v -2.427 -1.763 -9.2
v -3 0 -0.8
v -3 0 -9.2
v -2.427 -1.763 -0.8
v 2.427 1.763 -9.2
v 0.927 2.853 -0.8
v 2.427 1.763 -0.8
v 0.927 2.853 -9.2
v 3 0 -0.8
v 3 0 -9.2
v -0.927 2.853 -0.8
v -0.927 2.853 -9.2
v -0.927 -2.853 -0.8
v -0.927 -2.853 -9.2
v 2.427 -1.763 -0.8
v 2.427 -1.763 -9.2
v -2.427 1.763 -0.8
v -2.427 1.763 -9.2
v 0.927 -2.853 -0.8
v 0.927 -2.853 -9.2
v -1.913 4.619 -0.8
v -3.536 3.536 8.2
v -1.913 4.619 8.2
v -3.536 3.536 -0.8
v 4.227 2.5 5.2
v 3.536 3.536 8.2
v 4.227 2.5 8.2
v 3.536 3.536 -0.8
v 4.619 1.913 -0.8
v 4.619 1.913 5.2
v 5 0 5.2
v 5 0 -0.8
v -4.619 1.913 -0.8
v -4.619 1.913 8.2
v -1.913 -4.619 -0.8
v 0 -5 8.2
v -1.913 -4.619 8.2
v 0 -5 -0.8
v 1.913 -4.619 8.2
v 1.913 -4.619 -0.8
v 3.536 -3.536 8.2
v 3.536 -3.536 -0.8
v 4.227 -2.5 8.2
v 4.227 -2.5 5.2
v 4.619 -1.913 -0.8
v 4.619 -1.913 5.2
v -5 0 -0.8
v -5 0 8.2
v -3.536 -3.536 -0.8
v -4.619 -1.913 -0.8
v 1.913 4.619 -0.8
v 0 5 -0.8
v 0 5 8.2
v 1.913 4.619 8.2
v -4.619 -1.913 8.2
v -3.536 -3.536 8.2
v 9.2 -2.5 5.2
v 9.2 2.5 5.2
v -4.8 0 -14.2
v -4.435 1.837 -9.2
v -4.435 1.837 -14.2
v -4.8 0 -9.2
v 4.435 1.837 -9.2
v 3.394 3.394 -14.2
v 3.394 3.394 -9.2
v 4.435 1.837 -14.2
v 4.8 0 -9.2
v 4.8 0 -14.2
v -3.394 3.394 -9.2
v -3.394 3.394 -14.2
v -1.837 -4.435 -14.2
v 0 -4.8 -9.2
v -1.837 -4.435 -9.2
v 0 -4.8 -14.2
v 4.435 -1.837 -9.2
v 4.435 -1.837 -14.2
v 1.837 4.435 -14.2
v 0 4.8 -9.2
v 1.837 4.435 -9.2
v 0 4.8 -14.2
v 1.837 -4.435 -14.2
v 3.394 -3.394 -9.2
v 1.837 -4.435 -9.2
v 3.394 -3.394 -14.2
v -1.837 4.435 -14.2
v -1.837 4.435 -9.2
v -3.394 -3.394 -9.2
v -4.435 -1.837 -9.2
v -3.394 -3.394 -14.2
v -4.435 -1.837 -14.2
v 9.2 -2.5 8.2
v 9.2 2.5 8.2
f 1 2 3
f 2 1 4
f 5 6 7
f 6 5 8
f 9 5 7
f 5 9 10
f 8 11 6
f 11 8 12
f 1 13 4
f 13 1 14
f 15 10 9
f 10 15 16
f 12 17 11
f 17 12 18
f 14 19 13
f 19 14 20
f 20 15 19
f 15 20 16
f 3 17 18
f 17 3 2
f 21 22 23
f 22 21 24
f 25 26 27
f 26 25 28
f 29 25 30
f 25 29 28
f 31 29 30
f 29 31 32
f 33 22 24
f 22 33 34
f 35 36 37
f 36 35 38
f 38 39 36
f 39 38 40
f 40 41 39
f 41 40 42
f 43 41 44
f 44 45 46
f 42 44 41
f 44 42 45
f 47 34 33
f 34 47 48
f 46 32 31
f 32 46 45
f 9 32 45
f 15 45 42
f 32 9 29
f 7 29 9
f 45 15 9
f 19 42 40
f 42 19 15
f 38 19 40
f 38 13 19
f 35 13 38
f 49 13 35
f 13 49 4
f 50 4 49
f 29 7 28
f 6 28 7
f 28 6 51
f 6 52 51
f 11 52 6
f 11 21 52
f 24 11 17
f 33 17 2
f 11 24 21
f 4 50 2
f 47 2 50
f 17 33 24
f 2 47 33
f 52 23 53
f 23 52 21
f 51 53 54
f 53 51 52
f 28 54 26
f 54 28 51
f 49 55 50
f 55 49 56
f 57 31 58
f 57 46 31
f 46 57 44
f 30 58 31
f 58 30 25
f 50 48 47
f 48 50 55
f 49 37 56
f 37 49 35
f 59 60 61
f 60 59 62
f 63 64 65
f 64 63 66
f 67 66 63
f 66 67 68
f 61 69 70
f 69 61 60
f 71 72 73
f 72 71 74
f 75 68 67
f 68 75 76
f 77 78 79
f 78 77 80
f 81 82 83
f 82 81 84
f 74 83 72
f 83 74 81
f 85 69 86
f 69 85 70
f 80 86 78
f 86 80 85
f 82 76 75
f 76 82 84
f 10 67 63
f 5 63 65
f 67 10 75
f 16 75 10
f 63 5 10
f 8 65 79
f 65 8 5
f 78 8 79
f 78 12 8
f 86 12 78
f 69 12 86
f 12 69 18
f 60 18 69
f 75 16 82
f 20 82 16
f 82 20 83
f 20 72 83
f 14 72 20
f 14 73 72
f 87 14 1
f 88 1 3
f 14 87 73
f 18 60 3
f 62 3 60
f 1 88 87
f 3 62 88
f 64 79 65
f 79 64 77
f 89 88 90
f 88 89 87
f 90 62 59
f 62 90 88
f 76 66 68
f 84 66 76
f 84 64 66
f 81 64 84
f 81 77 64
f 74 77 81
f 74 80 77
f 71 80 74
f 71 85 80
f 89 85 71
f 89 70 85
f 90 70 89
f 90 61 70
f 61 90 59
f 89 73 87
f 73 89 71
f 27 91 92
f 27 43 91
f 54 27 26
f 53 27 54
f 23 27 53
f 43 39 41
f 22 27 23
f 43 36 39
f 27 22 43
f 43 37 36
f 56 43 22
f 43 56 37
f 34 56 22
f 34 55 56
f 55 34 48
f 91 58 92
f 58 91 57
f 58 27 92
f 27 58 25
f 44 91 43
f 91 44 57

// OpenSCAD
// Parameters
shank_diameter_mm = 6.0; //[3.0:12.0:0.1]
under_head_length_mm = 10.0; //[5.0:30.0:0.5]
head_diameter_mm = 10.0; //[6.0:20.0:0.1]
head_height_mm = 6.0; //[3.0:12.0:0.1]
socket_across_flats_mm = 5.0; //[3.0:10.0:0.1]
socket_depth_mm = 4.0; //[2.0:8.0:0.1]
under_head_chamfer_height_mm = 0.8; //[0.0:2.0:0.1]
overlap_mm = 0.8; //[0.2:2.0:0.1]

// Pcb Spacer - complete geometry
module pcb_spacer() {
  color([0.85, 0.85, 0.8]) {
    cylinder(r=shank_diameter_mm/2 + 1.8, h=under_head_length_mm/2, center=true);
  }
}

// Screw And Washer - complete geometry
module screw_and_washer() {
  color("DimGray") {
    union() {
      // Shank
      translate([0, 0, -under_head_length_mm/2])
        cylinder(r=shank_diameter_mm/2, h=under_head_length_mm, center=true);
      // Cap Head
      translate([0, 0, head_height_mm/2 - overlap_mm])
        cylinder(r=head_diameter_mm/2, h=head_height_mm, center=true);
      // Under-head Chamfer
      translate([0, 0, -under_head_chamfer_height_mm/2])
        cylinder(r1=head_diameter_mm/2, r2=shank_diameter_mm/2, h=under_head_chamfer_height_mm, center=true);
    }
    // Hex Socket Recess
    translate([0, 0, head_height_mm - socket_depth_mm/2 - overlap_mm])
      rotate([0, 0, 0])
      cylinder(r=socket_across_flats_mm/(2*cos(30)), h=socket_depth_mm, center=true);
  }
}

// Buzzer - complete geometry
module buzzer() {
  color([0.1, 0.1, 0.6]) {
    translate([0, 0, head_height_mm + (head_height_mm/4) - overlap_mm])
      cylinder(r=head_diameter_mm/2, h=head_height_mm/2, center=true);
  }
}

// Pin Socket - complete geometry
module pin_socket() {
  color([0.2, 0.2, 0.2]) {
    translate([head_diameter_mm/2 - overlap_mm, 0, head_height_mm + (head_height_mm/4) - overlap_mm])
      cube([head_diameter_mm, head_diameter_mm/2, head_height_mm/2], center=true);
  }
}

// Assembly
module assembly() {
  screw_and_washer();
  translate([0, 0, -under_head_length_mm - (under_head_length_mm/4) + overlap_mm]) pcb_spacer();
  buzzer();
  pin_socket();
}

assembly();
